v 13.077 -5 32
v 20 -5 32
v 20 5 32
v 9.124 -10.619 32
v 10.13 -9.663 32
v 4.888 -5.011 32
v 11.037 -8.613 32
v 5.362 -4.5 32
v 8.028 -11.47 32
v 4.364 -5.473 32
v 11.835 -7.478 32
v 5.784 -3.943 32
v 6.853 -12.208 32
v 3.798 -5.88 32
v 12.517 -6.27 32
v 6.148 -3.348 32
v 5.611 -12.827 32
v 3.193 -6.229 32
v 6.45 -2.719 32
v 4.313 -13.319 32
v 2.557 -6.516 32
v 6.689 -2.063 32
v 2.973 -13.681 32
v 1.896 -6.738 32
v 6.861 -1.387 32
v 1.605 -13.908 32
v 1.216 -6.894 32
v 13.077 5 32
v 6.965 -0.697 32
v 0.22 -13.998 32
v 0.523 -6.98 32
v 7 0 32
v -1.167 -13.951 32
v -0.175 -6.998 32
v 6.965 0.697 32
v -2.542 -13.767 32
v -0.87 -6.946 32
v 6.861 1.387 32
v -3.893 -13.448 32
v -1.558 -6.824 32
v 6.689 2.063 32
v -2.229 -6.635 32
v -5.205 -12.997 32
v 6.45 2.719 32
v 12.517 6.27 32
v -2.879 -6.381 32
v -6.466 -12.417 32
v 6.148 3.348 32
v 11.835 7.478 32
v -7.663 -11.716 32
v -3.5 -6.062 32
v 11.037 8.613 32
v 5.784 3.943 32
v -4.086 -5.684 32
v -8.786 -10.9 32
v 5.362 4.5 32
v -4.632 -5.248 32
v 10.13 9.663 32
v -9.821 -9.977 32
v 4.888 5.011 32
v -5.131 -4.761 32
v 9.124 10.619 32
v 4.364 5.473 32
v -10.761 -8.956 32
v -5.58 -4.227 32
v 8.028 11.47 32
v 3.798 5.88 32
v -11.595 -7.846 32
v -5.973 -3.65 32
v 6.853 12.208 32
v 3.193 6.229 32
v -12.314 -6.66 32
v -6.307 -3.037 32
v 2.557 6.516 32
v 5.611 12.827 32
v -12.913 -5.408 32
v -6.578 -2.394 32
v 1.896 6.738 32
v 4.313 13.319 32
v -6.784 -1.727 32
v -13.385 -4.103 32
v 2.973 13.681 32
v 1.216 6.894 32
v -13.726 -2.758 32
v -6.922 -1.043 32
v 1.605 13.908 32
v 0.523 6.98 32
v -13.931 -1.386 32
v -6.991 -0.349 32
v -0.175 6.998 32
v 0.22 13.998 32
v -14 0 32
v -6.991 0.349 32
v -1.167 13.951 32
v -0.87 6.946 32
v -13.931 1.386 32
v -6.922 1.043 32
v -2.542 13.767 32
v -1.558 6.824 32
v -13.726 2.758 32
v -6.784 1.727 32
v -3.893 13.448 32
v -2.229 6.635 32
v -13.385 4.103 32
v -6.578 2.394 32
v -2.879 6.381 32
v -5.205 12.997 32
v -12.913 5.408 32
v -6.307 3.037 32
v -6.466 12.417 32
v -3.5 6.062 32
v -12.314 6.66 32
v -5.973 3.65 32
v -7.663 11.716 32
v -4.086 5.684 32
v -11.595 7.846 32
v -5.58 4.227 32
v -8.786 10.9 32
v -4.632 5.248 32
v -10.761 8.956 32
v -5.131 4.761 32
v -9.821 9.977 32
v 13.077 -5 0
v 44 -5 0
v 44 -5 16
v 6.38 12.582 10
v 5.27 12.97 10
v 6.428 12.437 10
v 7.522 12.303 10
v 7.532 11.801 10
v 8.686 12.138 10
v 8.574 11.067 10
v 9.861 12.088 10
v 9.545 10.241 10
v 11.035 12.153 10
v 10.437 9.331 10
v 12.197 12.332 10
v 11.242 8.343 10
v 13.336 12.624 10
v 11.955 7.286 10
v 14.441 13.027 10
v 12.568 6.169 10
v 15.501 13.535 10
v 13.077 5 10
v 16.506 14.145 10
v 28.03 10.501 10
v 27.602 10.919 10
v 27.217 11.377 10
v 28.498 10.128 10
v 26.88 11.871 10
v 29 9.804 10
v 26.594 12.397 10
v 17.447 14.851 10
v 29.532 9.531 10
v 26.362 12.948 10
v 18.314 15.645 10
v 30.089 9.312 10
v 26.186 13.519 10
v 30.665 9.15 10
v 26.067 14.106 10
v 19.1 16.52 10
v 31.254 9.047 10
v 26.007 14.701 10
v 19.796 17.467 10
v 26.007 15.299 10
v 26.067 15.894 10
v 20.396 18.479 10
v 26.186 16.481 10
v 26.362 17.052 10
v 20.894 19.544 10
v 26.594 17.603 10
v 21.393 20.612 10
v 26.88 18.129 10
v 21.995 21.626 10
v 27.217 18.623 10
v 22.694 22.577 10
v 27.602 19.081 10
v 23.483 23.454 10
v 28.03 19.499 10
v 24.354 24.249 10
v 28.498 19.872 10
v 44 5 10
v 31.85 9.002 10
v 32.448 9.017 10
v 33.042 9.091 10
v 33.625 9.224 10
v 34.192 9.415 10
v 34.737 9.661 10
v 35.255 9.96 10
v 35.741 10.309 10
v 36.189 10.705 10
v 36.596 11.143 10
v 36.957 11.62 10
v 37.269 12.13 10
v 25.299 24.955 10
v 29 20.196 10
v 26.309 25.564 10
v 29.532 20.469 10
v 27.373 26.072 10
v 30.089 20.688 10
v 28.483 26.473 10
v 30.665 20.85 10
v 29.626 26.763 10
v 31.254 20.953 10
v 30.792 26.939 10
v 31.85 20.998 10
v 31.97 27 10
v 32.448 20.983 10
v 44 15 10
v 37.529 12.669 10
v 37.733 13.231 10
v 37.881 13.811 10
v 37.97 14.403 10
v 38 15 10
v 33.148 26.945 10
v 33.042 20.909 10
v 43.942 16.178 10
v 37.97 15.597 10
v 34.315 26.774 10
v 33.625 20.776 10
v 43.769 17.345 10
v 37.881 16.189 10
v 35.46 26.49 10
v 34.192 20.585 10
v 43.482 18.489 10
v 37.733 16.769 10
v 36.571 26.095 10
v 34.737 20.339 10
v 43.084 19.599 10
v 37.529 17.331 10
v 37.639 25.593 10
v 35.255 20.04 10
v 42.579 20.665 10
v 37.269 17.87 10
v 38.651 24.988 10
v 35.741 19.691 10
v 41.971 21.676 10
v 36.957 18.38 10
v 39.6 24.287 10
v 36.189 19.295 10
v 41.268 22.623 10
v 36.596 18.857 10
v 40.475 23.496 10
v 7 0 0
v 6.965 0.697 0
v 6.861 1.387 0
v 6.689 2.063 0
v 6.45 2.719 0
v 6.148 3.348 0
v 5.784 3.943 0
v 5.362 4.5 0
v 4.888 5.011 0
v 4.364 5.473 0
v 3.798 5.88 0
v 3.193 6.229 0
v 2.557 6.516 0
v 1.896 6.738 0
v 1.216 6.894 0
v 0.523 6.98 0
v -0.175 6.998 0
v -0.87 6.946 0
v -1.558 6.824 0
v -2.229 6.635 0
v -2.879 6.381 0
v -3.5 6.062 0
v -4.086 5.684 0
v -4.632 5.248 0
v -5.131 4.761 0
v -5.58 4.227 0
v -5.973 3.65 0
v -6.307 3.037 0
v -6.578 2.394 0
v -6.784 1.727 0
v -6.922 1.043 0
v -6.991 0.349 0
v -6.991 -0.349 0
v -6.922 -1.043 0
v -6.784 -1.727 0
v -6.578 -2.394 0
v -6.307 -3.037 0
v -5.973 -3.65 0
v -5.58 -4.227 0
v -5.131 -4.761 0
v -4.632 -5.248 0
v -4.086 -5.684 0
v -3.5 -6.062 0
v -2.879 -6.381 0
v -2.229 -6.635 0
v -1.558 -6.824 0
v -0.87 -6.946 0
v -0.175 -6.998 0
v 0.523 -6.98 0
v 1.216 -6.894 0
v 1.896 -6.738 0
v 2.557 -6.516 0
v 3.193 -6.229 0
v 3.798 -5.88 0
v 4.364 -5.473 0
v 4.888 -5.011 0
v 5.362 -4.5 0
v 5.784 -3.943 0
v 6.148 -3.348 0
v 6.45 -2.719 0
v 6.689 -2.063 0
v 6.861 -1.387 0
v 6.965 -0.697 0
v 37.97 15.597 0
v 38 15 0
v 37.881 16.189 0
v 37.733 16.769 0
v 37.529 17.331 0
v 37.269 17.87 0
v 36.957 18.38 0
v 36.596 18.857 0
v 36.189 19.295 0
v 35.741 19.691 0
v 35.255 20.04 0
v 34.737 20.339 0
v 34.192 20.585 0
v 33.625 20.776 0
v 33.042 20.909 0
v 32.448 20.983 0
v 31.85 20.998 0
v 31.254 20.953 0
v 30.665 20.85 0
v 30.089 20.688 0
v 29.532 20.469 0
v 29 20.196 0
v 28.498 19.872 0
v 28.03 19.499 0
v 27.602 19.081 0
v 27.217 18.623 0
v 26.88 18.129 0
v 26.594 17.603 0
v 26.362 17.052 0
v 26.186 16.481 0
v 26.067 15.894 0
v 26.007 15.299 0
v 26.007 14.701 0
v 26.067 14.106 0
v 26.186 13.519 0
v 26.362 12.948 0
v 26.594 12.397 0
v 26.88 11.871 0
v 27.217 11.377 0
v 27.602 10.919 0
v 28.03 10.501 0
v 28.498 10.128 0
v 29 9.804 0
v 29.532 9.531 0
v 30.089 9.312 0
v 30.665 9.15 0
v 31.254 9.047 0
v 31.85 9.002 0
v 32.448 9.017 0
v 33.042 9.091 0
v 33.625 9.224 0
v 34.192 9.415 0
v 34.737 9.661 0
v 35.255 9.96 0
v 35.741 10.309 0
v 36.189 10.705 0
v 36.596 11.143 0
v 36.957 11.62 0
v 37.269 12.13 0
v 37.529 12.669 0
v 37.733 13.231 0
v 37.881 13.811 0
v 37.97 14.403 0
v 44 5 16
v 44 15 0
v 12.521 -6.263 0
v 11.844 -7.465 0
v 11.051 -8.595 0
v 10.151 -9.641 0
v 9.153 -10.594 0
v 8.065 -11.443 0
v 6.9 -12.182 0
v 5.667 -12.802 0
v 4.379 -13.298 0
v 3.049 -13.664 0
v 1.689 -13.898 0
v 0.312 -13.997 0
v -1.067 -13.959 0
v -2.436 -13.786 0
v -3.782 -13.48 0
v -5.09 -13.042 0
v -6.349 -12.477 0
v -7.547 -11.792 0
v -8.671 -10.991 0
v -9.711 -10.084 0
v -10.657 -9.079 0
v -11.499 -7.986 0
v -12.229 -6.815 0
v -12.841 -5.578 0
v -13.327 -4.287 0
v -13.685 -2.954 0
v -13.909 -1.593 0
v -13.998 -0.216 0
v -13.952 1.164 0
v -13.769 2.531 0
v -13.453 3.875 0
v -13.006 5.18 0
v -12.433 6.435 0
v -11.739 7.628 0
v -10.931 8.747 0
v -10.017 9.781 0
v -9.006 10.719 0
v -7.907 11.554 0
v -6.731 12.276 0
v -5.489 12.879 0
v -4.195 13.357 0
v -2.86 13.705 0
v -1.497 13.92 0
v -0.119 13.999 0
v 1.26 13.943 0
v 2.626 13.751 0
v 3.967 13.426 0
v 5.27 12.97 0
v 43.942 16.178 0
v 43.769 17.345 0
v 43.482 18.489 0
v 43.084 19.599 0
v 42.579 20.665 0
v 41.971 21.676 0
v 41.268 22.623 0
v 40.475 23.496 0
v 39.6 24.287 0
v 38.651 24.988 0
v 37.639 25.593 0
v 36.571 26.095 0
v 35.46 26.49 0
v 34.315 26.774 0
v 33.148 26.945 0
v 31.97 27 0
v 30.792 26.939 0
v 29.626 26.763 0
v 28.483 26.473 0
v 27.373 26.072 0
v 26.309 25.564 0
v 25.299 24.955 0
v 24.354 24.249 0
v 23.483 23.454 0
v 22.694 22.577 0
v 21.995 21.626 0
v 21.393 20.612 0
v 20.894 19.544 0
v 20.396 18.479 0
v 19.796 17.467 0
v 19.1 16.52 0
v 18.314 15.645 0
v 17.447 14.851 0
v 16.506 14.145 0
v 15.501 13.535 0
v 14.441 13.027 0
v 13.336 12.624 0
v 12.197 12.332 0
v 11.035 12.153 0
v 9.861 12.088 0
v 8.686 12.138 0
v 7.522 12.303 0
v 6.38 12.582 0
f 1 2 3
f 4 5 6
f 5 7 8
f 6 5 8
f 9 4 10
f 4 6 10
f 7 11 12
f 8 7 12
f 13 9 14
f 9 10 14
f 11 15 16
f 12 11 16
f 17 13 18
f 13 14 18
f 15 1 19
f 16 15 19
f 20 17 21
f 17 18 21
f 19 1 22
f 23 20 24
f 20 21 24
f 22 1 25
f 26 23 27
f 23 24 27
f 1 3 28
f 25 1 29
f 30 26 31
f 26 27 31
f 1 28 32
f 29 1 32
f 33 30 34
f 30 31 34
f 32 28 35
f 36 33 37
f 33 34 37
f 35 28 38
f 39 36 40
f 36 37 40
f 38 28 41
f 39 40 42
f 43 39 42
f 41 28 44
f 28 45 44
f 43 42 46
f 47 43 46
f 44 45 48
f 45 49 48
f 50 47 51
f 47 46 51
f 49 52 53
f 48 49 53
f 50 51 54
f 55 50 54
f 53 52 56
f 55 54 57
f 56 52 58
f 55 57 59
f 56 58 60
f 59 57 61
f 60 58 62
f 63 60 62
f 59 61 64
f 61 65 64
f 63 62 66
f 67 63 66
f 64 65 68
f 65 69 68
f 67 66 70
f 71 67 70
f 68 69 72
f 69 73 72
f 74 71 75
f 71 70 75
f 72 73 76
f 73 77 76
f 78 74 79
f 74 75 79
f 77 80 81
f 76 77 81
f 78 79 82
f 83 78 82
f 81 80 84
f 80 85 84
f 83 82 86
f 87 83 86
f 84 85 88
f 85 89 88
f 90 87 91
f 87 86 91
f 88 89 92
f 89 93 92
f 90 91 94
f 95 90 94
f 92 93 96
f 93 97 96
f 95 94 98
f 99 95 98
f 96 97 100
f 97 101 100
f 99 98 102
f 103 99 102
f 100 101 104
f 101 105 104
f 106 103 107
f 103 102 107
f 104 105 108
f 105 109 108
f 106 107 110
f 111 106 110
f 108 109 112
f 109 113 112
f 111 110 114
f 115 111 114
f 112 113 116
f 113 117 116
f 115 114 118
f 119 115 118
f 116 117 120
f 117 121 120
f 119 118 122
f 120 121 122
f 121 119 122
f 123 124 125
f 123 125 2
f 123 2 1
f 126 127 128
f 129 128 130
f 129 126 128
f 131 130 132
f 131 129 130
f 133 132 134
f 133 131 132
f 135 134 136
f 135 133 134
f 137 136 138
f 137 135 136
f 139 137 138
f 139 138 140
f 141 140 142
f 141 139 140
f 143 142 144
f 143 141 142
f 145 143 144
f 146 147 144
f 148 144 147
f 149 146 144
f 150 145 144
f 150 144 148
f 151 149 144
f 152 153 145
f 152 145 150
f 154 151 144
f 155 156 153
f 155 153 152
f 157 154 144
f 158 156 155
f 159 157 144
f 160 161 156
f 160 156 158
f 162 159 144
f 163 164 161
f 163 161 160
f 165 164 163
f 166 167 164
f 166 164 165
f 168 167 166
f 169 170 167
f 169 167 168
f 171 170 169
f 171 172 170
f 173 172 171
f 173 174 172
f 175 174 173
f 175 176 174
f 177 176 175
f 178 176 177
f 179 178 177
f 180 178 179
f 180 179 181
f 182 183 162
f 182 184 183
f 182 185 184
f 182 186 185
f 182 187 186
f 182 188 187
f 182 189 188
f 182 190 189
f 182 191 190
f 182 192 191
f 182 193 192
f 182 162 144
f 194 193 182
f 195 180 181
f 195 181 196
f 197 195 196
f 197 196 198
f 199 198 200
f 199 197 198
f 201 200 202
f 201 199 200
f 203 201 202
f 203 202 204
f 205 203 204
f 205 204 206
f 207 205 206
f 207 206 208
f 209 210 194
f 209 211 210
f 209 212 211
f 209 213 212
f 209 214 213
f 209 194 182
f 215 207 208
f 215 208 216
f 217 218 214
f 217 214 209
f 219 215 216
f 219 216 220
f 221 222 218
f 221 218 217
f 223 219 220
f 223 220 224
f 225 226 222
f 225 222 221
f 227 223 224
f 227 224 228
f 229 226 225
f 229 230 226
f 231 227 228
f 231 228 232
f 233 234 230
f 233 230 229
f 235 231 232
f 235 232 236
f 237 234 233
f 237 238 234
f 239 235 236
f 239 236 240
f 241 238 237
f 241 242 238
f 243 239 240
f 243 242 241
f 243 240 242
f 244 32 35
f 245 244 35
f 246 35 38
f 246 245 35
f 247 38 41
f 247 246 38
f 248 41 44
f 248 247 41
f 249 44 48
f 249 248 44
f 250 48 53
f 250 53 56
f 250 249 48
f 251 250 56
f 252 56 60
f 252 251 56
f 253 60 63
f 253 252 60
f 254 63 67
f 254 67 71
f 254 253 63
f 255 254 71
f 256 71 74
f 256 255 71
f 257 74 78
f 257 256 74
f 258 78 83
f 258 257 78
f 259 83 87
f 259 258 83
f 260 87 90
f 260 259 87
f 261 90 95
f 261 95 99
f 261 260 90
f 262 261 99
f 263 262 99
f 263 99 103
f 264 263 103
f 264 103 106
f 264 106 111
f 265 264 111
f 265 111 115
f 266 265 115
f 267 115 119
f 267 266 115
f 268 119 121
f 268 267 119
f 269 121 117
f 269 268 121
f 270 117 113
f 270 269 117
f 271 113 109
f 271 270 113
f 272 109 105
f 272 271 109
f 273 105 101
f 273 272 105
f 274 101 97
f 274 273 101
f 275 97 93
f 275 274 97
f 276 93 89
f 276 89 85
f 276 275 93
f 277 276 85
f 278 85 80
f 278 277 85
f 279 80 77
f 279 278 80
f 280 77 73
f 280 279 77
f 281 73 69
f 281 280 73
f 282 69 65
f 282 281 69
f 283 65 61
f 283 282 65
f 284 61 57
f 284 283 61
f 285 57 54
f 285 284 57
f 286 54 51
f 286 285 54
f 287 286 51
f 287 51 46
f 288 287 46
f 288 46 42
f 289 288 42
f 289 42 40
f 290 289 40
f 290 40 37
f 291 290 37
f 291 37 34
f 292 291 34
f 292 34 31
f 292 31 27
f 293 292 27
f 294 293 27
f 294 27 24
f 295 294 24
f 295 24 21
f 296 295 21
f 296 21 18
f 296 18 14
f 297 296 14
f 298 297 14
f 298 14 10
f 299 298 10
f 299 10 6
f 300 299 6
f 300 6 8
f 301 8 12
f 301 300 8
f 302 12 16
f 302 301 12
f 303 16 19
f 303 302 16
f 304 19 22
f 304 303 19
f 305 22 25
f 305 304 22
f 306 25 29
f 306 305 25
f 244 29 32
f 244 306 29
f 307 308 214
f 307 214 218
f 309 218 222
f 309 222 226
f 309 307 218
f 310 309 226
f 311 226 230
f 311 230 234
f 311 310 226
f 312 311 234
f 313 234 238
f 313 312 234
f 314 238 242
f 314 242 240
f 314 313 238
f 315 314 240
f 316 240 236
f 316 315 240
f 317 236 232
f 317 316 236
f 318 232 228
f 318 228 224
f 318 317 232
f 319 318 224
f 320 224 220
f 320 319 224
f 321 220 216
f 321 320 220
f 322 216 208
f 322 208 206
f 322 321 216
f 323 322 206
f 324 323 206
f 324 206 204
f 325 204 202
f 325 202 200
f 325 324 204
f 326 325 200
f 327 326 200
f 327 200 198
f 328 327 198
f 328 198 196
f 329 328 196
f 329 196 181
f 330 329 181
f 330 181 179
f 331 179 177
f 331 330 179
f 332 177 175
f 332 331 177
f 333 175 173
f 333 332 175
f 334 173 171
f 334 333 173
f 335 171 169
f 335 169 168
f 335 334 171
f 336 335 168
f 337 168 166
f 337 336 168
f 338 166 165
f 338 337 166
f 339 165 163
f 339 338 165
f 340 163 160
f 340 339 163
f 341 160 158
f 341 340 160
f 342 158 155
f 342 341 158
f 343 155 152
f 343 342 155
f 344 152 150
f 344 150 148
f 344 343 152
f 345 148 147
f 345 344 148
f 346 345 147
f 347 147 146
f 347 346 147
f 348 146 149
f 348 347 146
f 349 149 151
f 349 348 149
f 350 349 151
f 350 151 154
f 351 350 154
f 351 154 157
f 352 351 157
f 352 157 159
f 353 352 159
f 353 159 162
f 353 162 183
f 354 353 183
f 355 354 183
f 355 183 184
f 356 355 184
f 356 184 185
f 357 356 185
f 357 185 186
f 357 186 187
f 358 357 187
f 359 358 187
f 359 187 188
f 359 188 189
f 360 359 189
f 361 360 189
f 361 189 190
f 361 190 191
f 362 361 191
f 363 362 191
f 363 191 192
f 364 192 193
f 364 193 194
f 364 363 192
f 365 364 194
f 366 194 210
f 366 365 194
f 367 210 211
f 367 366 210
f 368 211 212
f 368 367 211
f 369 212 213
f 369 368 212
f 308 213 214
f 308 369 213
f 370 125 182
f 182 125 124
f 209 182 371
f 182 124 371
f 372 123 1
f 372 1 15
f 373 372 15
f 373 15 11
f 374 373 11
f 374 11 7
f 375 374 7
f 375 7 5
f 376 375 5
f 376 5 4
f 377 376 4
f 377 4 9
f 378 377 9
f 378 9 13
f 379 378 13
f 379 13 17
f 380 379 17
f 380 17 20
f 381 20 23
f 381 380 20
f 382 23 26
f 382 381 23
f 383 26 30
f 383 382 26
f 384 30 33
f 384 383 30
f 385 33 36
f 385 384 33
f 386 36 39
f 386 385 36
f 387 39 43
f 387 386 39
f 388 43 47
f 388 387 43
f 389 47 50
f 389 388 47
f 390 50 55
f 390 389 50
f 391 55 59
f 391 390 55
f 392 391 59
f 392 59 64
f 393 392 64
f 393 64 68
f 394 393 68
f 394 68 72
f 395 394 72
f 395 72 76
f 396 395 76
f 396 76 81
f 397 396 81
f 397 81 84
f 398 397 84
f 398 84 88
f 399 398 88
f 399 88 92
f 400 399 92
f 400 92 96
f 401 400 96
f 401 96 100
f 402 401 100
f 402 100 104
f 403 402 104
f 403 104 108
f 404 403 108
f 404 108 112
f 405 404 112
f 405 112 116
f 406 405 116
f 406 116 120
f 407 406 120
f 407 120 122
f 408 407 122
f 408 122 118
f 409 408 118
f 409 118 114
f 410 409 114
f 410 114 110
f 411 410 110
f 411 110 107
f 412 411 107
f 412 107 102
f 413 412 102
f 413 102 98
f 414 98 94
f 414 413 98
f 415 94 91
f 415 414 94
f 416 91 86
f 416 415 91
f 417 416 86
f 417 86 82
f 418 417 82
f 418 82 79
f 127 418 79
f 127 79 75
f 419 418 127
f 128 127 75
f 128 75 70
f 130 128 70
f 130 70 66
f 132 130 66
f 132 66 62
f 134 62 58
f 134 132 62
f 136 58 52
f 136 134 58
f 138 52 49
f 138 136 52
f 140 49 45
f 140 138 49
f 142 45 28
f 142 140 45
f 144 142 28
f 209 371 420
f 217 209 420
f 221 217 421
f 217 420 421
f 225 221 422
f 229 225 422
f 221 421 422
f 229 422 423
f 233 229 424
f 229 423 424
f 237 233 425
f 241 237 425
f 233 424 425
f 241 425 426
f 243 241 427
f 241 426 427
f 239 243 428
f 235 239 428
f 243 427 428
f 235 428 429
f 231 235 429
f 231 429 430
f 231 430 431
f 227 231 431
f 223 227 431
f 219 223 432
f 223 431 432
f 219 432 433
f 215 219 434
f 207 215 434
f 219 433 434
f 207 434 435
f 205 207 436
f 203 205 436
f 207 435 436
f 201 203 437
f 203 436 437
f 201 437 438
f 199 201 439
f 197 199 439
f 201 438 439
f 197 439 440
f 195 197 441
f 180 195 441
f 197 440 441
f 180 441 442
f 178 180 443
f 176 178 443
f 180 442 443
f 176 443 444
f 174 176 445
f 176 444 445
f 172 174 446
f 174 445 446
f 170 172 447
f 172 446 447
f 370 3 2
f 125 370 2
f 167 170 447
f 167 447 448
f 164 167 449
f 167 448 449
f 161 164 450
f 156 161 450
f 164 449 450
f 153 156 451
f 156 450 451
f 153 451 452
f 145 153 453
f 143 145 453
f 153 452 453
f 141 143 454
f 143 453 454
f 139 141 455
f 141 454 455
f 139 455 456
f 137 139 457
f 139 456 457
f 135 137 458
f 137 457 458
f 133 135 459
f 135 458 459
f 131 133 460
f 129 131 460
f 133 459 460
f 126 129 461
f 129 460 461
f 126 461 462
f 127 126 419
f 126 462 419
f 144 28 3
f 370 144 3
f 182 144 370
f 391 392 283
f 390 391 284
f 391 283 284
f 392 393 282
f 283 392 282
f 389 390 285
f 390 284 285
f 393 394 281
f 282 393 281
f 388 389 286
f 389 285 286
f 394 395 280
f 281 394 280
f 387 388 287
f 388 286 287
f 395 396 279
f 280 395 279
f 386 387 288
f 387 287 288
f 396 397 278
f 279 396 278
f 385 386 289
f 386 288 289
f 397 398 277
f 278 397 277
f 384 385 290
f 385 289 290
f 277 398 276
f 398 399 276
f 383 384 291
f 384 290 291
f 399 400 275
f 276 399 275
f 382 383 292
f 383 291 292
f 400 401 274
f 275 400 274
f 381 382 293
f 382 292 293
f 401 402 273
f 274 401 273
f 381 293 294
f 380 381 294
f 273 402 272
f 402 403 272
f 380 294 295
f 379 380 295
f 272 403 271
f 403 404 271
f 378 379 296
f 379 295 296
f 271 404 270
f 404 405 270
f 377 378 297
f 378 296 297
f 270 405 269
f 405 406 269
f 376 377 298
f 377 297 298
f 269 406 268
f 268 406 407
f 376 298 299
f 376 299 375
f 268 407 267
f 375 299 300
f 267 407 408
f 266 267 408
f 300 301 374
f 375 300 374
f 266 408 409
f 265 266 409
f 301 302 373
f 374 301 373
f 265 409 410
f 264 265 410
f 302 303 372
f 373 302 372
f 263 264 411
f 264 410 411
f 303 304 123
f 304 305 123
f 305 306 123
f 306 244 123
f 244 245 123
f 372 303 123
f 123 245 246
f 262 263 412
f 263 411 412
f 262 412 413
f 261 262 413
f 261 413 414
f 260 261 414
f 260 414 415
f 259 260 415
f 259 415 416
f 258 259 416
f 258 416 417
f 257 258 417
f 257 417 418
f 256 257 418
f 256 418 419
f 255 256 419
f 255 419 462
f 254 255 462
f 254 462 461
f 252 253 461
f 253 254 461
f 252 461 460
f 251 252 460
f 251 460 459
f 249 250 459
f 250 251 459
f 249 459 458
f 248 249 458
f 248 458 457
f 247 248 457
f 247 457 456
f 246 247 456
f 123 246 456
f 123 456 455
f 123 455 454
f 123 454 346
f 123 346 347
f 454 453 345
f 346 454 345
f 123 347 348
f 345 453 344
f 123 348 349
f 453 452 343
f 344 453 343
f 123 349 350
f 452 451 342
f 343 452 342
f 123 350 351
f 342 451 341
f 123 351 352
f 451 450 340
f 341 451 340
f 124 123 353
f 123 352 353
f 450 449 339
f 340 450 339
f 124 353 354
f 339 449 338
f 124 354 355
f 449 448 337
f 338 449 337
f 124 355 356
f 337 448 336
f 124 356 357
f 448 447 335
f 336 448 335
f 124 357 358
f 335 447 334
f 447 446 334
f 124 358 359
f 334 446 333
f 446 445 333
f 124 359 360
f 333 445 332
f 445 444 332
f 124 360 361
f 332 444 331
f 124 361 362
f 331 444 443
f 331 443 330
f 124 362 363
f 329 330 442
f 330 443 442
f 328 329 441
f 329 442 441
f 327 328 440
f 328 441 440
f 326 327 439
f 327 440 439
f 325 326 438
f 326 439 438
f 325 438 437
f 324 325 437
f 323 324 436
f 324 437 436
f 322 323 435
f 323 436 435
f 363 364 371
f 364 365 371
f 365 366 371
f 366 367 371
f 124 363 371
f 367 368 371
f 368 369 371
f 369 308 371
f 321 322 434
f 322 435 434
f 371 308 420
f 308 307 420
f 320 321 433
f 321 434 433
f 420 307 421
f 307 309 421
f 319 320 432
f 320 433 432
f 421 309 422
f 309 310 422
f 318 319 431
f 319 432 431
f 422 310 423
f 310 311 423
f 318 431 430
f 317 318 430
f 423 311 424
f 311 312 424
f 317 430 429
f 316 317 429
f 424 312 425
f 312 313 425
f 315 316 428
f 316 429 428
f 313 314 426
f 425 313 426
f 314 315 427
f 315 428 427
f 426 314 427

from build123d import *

# Parameters (mm, degrees)
SKETCH1_R           = 7
BOSS_EXTRUDE1_DEPTH = 32
SKETCH1_3_R         = 6
BOSS_EXTRUDE2_DEPTH = 10
CHAMFER1_SIZE       = 16
CHAMFER1_SIZE2      = 24


with BuildPart() as part:
    # Sketch1 → Boss-Extrude1 (new body)
    with BuildSketch(Plane.XY):
        with BuildLine():
            ThreePointArc((5.269950687, 12.970259047), (-12.84065502, -5.578313245), (13.076696831, -5))
            Line((13.076696831, -5), (44, -5))
            Line((44, -5), (44, 5))
            Line((44, 5), (20, 5))
            Line((20, 5), (13.076696831, 5))
            ThreePointArc((13.076696831, 5), (10.001556184, 9.796370445), (5.269950687, 12.970259047))
        make_face()
        Circle(SKETCH1_R, mode=Mode.SUBTRACT)
    extrude(amount=BOSS_EXTRUDE1_DEPTH)

    # Sketch1<3> → Boss-Extrude2 (add)
    with BuildSketch(Plane.XY):
        with BuildLine():
            ThreePointArc((20.893525638, 19.543811973), (14.440852002, 13.026785876), (5.269950687, 12.970259047))
            ThreePointArc((5.269950687, 12.970259047), (10.001556184, 9.796370445), (13.076696831, 5))
            Line((13.076696831, 5), (20, 5))
            Line((20, 5), (44, 5))
            Line((44, 5), (44, 15))
            ThreePointArc((44, 15), (34.315416556, 26.774499827), (20.893525638, 19.543811973))
        make_face()
        with Locations((32, 15)):
            Circle(SKETCH1_3_R, mode=Mode.SUBTRACT)
    extrude(amount=BOSS_EXTRUDE2_DEPTH)

    # Chamfer1
    chamfer1_edges = [part.edges().sort_by_distance(p)[0] for p in [
        (44, 0, 32),
    ]]
    chamfer1_side = [part.faces().sort_by_distance(p)[0] for p in [
        (44, 2.380952381, 13.380952381),
    ]]
    chamfer(chamfer1_edges, length=CHAMFER1_SIZE, length2=CHAMFER1_SIZE2, reference=chamfer1_side[0])


solid = part.part
